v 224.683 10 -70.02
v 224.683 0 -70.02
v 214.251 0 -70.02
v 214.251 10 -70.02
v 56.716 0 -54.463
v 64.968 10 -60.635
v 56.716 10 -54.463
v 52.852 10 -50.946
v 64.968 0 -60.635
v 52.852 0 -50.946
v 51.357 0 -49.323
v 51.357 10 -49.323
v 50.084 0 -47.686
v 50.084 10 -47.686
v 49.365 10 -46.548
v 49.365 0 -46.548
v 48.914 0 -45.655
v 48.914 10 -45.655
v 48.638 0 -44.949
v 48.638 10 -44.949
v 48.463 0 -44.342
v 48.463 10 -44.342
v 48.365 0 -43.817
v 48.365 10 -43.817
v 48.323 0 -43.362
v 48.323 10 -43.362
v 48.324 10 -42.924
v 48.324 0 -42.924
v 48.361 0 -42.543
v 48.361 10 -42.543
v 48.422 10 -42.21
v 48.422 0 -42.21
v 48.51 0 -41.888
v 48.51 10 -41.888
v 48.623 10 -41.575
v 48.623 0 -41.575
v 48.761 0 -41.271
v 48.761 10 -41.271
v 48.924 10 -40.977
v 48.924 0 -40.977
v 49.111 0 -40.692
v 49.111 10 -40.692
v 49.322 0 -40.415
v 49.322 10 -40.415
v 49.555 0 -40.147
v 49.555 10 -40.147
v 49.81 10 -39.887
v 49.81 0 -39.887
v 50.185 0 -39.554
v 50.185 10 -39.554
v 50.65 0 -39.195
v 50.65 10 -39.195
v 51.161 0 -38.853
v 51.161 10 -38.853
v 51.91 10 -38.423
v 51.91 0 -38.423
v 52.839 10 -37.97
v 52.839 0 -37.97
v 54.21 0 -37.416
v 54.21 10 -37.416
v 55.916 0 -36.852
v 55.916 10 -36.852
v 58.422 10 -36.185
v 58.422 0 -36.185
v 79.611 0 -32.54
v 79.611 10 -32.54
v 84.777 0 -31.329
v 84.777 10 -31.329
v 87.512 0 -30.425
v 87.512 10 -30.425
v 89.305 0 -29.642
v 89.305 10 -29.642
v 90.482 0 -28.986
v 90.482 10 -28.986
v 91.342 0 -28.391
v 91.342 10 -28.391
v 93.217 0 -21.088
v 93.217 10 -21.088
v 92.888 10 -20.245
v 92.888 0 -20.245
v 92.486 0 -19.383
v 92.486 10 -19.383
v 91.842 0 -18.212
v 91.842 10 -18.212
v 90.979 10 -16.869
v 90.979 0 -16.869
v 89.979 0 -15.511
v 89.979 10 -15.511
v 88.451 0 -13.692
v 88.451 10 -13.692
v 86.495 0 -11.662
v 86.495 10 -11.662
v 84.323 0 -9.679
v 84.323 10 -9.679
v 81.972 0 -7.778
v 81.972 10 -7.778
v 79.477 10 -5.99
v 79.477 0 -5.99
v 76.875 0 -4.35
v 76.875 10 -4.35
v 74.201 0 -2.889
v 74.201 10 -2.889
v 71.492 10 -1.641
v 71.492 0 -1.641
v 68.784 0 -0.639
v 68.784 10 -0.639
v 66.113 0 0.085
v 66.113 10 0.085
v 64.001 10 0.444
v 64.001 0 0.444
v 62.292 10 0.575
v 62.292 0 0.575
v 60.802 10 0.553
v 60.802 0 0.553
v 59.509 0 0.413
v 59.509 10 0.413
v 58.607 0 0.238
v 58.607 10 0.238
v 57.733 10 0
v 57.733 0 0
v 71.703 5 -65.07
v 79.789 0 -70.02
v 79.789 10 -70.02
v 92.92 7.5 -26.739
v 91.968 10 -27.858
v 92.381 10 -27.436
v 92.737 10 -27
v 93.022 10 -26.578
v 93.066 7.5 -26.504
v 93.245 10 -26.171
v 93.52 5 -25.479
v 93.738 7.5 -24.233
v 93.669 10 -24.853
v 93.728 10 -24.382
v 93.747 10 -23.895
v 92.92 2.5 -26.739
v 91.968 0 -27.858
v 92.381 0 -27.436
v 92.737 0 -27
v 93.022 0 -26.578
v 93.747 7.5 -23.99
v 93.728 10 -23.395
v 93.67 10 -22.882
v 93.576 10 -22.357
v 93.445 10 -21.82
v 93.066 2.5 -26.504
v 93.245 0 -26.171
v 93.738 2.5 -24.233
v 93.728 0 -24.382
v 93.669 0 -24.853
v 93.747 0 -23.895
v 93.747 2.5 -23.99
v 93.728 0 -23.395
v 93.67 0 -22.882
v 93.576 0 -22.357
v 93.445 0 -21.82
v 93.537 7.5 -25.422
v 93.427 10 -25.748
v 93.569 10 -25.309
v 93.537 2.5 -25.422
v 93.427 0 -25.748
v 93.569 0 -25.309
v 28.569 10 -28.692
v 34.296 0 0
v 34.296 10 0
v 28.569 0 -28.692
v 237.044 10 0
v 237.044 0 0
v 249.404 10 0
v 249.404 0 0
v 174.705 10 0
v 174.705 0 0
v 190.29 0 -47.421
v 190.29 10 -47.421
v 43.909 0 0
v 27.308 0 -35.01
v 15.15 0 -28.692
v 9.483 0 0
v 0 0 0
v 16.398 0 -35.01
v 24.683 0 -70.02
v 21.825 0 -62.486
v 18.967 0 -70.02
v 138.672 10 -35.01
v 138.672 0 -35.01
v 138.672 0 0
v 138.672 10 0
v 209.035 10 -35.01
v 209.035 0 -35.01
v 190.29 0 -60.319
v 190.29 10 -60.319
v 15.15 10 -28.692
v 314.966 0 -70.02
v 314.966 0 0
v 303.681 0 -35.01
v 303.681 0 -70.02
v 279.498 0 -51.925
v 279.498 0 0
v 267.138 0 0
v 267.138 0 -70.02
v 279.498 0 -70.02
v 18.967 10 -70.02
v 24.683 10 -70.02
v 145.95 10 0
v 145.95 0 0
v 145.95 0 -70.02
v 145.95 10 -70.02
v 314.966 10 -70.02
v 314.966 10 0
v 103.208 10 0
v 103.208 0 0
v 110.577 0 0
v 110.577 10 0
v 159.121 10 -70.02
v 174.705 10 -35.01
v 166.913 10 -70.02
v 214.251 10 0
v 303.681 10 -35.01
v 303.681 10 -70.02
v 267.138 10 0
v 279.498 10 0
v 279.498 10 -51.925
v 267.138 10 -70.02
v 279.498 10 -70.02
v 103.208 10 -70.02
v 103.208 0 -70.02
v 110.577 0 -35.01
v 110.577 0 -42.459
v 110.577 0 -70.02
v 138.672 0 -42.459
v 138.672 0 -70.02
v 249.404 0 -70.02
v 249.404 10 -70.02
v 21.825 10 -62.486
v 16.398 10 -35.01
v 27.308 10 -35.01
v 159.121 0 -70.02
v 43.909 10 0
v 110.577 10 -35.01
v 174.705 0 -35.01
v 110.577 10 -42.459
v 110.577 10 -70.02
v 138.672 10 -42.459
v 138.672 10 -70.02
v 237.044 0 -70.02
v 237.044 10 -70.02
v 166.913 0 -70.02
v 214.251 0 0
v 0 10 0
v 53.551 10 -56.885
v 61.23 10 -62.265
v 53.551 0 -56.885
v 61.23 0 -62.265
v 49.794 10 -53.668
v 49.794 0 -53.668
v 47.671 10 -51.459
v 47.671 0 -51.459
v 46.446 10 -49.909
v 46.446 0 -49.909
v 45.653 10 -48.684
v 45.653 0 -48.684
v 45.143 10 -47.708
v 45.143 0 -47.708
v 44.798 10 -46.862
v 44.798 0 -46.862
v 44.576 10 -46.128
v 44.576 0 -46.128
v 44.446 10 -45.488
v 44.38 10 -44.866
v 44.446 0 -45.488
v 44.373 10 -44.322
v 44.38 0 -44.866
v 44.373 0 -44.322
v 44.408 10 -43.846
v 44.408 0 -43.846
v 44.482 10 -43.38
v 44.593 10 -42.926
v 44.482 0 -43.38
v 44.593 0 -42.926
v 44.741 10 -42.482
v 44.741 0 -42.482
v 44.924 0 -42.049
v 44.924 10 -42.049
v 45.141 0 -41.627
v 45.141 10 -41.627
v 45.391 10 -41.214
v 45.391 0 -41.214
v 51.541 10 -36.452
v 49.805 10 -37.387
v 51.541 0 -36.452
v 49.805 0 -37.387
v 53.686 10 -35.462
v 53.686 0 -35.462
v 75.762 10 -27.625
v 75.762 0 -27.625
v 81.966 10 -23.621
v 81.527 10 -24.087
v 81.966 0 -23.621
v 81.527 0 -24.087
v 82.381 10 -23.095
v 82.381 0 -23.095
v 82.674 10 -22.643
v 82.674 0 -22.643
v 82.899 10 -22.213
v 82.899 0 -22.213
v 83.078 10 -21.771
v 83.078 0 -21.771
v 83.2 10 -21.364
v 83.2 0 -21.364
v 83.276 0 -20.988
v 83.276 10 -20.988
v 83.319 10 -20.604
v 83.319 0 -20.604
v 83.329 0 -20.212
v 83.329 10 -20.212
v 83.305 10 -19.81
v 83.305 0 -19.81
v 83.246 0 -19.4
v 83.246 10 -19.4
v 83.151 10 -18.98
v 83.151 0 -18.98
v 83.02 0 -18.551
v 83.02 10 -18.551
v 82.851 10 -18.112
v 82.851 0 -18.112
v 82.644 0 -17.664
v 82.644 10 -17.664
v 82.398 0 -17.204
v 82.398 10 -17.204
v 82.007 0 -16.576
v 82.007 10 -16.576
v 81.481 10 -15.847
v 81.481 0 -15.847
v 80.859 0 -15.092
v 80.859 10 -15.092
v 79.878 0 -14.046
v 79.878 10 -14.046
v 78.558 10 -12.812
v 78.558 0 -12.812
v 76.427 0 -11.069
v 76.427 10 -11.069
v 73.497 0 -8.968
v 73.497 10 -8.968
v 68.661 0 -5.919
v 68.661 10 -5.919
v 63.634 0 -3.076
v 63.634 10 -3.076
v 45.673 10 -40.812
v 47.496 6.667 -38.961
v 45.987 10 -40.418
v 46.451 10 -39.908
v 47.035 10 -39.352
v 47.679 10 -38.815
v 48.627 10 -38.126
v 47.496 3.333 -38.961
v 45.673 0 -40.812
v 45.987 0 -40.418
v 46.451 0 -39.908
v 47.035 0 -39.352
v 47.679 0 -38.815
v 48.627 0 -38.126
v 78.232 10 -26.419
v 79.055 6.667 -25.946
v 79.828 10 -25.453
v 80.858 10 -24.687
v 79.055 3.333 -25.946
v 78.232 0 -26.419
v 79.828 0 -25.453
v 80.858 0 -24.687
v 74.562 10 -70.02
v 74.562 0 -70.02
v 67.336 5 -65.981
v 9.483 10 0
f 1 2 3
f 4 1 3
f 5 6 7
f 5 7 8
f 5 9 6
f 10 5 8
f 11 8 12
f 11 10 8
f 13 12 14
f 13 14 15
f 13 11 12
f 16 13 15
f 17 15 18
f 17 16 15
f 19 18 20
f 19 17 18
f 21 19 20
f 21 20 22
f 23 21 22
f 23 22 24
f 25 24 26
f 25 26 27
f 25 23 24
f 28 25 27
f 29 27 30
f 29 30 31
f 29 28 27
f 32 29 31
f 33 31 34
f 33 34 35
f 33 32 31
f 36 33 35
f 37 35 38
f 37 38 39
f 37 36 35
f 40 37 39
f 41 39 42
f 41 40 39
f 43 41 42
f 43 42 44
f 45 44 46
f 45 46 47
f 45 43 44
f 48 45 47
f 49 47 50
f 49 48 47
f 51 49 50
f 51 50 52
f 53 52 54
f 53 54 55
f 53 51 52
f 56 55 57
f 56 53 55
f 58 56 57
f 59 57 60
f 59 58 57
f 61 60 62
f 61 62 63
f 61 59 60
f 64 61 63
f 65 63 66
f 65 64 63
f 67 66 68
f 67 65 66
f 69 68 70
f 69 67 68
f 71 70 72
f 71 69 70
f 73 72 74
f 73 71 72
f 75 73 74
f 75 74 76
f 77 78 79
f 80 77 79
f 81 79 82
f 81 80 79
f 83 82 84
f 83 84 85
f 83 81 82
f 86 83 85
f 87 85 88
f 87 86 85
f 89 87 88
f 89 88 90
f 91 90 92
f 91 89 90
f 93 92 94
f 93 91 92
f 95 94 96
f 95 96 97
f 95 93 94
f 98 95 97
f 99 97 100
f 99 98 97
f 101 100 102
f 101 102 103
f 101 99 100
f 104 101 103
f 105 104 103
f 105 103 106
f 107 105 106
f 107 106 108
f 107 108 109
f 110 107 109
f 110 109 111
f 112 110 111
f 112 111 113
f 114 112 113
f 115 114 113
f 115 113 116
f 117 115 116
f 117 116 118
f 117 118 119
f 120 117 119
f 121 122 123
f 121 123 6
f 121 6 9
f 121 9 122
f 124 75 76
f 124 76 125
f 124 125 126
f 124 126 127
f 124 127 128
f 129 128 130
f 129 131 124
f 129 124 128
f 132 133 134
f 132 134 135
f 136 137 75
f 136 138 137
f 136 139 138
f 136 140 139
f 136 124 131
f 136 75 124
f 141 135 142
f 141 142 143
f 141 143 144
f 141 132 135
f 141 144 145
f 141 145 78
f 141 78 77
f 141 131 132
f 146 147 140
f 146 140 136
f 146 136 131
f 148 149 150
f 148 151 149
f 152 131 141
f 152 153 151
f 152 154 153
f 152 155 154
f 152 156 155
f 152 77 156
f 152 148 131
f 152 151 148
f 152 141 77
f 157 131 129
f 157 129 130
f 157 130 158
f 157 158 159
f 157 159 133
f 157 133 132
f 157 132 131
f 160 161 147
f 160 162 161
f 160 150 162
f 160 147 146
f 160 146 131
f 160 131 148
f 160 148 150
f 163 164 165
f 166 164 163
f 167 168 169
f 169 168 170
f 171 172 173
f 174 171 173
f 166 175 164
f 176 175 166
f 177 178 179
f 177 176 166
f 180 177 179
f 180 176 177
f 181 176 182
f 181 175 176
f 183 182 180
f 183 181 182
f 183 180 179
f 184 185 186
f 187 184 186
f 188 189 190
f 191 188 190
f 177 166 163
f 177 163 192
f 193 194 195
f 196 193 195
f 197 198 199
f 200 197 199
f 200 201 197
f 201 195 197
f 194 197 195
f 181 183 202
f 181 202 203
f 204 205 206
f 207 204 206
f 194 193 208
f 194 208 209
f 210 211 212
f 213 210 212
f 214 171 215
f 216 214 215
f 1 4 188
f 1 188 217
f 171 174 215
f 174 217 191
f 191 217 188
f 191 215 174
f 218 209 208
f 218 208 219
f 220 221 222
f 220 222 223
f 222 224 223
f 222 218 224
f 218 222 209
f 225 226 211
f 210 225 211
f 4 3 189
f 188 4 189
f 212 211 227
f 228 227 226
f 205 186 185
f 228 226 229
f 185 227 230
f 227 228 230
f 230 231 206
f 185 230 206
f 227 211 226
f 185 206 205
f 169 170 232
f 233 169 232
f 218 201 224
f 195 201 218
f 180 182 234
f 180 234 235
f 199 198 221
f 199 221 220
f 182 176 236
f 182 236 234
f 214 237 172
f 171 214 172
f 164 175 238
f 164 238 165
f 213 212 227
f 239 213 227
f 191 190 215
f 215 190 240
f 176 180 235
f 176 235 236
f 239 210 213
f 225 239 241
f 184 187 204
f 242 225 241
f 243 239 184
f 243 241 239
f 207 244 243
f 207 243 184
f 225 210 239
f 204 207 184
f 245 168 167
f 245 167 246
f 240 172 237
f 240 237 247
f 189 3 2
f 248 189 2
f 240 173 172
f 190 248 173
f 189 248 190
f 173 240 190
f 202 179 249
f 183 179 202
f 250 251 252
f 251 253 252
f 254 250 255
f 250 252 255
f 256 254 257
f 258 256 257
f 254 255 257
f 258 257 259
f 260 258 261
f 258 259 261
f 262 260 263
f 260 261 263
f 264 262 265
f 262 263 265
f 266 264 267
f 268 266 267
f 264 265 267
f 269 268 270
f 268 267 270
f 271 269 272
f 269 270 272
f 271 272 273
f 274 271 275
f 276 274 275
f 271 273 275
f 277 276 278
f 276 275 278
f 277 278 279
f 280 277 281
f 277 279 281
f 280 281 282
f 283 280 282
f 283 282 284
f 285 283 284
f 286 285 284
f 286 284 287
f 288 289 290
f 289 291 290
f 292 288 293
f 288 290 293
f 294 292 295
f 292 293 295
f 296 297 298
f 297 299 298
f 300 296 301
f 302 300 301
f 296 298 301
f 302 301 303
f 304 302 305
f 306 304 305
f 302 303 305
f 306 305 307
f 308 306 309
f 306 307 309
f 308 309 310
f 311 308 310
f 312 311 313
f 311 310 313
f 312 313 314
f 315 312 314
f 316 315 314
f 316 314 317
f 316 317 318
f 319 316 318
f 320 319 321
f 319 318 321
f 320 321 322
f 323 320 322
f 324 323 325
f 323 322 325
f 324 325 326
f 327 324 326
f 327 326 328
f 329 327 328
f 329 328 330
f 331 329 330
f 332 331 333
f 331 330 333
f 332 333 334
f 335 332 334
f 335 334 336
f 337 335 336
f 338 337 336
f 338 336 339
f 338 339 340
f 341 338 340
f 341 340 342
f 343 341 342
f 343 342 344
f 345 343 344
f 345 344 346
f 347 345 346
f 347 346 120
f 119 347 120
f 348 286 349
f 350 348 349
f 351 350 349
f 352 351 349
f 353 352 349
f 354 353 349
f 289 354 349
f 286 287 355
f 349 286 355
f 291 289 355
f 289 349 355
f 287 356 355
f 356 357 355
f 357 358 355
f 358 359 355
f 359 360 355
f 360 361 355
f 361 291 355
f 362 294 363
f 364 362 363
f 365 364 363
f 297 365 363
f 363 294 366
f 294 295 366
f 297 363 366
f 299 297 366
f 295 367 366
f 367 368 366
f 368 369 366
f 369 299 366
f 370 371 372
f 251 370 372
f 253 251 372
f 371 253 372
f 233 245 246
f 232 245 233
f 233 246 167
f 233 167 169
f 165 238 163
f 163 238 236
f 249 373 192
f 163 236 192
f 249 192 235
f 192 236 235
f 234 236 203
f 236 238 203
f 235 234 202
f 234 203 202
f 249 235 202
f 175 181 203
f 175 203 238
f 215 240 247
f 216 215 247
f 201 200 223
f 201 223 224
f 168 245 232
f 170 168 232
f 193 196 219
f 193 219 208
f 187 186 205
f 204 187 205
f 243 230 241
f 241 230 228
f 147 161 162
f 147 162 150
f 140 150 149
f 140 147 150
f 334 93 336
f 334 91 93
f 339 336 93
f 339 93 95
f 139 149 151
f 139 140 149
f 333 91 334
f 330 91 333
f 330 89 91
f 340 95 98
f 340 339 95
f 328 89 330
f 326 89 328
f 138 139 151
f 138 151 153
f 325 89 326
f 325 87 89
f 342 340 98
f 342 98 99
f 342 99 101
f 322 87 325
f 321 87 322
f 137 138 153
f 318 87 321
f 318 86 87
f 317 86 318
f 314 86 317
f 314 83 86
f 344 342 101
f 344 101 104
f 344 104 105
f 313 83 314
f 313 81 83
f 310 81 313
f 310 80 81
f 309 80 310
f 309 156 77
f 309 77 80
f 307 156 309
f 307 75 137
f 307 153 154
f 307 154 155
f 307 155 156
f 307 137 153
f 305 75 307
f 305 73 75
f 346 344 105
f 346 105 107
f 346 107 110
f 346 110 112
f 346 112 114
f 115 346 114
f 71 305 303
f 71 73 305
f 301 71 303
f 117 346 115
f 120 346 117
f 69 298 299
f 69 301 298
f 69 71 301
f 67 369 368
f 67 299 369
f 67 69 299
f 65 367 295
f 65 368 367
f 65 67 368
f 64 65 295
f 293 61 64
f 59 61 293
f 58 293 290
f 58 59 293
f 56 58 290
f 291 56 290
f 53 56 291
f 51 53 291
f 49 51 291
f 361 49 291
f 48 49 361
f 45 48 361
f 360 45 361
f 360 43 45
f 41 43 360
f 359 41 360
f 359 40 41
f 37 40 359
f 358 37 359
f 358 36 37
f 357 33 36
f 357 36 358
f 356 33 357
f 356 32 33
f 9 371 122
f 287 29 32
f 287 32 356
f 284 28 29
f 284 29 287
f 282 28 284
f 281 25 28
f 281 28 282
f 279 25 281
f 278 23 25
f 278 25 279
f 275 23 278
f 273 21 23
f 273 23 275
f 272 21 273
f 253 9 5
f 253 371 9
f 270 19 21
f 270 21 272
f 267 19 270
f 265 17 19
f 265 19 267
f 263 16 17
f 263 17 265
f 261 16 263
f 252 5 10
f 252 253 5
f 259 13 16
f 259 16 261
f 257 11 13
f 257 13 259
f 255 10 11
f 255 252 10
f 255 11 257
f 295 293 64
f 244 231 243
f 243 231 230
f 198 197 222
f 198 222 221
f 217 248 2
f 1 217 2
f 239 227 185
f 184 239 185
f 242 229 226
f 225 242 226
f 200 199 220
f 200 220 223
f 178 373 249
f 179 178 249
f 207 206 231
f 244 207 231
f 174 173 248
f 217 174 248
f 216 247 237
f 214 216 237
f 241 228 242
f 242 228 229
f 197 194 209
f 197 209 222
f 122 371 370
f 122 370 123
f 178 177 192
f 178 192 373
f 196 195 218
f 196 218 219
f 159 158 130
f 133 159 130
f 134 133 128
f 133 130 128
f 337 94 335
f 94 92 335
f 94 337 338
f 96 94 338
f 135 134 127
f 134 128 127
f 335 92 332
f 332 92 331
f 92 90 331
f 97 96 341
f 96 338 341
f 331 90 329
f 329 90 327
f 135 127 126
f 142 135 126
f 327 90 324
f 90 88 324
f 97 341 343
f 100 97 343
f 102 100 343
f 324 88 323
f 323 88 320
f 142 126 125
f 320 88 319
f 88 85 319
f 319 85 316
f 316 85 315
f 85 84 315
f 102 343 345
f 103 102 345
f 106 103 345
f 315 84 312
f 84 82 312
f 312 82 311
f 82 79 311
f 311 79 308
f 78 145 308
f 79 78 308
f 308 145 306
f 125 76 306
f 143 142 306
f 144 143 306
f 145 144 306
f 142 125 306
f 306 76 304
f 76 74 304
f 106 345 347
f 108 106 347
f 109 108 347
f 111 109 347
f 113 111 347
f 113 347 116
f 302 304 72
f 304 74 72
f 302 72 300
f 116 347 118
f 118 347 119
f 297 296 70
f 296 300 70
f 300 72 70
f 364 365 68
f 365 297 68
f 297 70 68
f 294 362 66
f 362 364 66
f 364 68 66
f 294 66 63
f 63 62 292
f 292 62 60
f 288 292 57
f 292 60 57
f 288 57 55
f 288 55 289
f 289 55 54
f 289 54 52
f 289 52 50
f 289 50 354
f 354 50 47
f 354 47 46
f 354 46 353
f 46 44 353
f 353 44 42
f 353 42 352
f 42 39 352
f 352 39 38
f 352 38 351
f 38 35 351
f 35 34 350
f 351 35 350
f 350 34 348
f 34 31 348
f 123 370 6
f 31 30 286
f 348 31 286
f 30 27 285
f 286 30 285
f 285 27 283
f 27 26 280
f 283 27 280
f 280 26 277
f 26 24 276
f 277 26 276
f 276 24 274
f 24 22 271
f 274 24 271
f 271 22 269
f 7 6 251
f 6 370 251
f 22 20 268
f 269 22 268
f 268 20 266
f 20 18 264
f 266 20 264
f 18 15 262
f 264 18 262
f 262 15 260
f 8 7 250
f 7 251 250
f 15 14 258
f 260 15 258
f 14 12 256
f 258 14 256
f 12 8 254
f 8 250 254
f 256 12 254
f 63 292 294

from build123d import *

# Parameters (mm, degrees)
BOSS_EXTRUDE1_DEPTH   = 10
BOSS_EXTRUDE1_2_DEPTH = 10
BOSS_EXTRUDE1_3_DEPTH = 10
BOSS_EXTRUDE1_4_DEPTH = 10
BOSS_EXTRUDE1_5_DEPTH = 10
SKETCH1_W             = 12.36015051
SKETCH1_H             = 70.020465147
BOSS_EXTRUDE1_6_DEPTH = 10


with BuildPart() as part:
    # Sketch1 → Boss-Extrude1 (new body)
    with BuildSketch(Plane(origin=(0, 0, 0), x_dir=(1, 0, 0), z_dir=(0, 1, 0))):
        Polygon((0, 0), (18.966582396, 70.020465147), (24.682538735, 70.020465147), (43.908937328, 0), (34.295738031, 0), (28.569257688, 28.692052555), (15.150120705, 28.692052555), (9.483291198, 0), align=None)
        Polygon((21.824560565, 62.485795428), (16.397994097, 35.010232574), (27.308248786, 35.010232574), align=None, mode=Mode.SUBTRACT)
    extrude(amount=BOSS_EXTRUDE1_DEPTH)


with BuildPart() as body_2:
    # Sketch1 → Boss-Extrude1 2 (new body)
    with BuildSketch(Plane(origin=(0, 0, 0), x_dir=(1, 0, 0), z_dir=(0, 1, 0))):
        with BuildLine():
            Line((74.561942632, 70.020465147), (79.789367499, 70.020465147))
            add(Edge.make_bspline(
                [(79.789367499, 70.020465147), (3.812346401, 24.911528702), (138.810461133, 50.824090878), (71.32127094, -4.287466603), (57.73314392, 0)],
                knots=[0, 0, 0, 0, 0.628481491, 1, 1, 1, 1], degree=3))
            add(Edge.make_bspline(
                [(74.561942632, 70.020465147), (-18.984373481, 19.61194677), (142.663839025, 42.738208807), (57.73314392, 0)],
                knots=[0, 0, 0, 0, 1, 1, 1, 1], degree=3))
        make_face()
    extrude(amount=BOSS_EXTRUDE1_2_DEPTH)


with BuildPart() as body_3:
    # Sketch1 → Boss-Extrude1 3 (new body)
    with BuildSketch(Plane(origin=(0, 0, 0), x_dir=(1, 0, 0), z_dir=(0, 1, 0))):
        Polygon((103.208059562, 70.020465147), (103.208059562, 0), (110.577241701, 0), (110.577241701, 35.010232574), (138.672248606, 35.010232574), (138.672248606, 0), (145.949605986, 0), (145.949605986, 70.020465147), (138.672248606, 70.020465147), (138.672248606, 42.458982771), (110.577241701, 42.458982771), (110.577241701, 70.020465147), align=None)
    extrude(amount=BOSS_EXTRUDE1_3_DEPTH)


with BuildPart() as body_4:
    # Sketch1 → Boss-Extrude1 4 (new body)
    with BuildSketch(Plane(origin=(0, 0, 0), x_dir=(1, 0, 0), z_dir=(0, 1, 0))):
        Polygon((159.120878447, 70.020465147), (174.705416046, 0), (190.289953645, 47.420838912), (214.251466133, 0), (224.683415933, 70.020465147), (214.251466133, 70.020465147), (209.035491234, 35.010232574), (190.289953645, 60.319199573), (174.705416046, 35.010232574), (166.913147247, 70.020465147), align=None)
    extrude(amount=BOSS_EXTRUDE1_4_DEPTH)


with BuildPart() as body_5:
    # Sketch1 → Boss-Extrude1 5 (new body)
    with BuildSketch(Plane(origin=(0, 0, 0), x_dir=(1, 0, 0), z_dir=(0, 1, 0))):
        Polygon((267.137845944, 0), (267.137845944, 70.020465147), (279.497996453, 70.020465147), (303.680899624, 35.010232574), (303.680899624, 70.020465147), (314.966254437, 70.020465147), (314.966254437, 0), (279.497996453, 51.925288761), (279.497996453, 0), align=None)
    extrude(amount=BOSS_EXTRUDE1_5_DEPTH)


with BuildPart() as body_6:
    # Sketch1 → Boss-Extrude1 6 (new body)
    with BuildSketch(Plane(origin=(0, 0, 0), x_dir=(1, 0, 0), z_dir=(0, 1, 0))):
        with Locations((243.223641697, 35.010232574)):
            Rectangle(SKETCH1_W, SKETCH1_H)
    extrude(amount=BOSS_EXTRUDE1_6_DEPTH)


solid = Compound([part.part, body_2.part, body_3.part, body_4.part, body_5.part, body_6.part])
